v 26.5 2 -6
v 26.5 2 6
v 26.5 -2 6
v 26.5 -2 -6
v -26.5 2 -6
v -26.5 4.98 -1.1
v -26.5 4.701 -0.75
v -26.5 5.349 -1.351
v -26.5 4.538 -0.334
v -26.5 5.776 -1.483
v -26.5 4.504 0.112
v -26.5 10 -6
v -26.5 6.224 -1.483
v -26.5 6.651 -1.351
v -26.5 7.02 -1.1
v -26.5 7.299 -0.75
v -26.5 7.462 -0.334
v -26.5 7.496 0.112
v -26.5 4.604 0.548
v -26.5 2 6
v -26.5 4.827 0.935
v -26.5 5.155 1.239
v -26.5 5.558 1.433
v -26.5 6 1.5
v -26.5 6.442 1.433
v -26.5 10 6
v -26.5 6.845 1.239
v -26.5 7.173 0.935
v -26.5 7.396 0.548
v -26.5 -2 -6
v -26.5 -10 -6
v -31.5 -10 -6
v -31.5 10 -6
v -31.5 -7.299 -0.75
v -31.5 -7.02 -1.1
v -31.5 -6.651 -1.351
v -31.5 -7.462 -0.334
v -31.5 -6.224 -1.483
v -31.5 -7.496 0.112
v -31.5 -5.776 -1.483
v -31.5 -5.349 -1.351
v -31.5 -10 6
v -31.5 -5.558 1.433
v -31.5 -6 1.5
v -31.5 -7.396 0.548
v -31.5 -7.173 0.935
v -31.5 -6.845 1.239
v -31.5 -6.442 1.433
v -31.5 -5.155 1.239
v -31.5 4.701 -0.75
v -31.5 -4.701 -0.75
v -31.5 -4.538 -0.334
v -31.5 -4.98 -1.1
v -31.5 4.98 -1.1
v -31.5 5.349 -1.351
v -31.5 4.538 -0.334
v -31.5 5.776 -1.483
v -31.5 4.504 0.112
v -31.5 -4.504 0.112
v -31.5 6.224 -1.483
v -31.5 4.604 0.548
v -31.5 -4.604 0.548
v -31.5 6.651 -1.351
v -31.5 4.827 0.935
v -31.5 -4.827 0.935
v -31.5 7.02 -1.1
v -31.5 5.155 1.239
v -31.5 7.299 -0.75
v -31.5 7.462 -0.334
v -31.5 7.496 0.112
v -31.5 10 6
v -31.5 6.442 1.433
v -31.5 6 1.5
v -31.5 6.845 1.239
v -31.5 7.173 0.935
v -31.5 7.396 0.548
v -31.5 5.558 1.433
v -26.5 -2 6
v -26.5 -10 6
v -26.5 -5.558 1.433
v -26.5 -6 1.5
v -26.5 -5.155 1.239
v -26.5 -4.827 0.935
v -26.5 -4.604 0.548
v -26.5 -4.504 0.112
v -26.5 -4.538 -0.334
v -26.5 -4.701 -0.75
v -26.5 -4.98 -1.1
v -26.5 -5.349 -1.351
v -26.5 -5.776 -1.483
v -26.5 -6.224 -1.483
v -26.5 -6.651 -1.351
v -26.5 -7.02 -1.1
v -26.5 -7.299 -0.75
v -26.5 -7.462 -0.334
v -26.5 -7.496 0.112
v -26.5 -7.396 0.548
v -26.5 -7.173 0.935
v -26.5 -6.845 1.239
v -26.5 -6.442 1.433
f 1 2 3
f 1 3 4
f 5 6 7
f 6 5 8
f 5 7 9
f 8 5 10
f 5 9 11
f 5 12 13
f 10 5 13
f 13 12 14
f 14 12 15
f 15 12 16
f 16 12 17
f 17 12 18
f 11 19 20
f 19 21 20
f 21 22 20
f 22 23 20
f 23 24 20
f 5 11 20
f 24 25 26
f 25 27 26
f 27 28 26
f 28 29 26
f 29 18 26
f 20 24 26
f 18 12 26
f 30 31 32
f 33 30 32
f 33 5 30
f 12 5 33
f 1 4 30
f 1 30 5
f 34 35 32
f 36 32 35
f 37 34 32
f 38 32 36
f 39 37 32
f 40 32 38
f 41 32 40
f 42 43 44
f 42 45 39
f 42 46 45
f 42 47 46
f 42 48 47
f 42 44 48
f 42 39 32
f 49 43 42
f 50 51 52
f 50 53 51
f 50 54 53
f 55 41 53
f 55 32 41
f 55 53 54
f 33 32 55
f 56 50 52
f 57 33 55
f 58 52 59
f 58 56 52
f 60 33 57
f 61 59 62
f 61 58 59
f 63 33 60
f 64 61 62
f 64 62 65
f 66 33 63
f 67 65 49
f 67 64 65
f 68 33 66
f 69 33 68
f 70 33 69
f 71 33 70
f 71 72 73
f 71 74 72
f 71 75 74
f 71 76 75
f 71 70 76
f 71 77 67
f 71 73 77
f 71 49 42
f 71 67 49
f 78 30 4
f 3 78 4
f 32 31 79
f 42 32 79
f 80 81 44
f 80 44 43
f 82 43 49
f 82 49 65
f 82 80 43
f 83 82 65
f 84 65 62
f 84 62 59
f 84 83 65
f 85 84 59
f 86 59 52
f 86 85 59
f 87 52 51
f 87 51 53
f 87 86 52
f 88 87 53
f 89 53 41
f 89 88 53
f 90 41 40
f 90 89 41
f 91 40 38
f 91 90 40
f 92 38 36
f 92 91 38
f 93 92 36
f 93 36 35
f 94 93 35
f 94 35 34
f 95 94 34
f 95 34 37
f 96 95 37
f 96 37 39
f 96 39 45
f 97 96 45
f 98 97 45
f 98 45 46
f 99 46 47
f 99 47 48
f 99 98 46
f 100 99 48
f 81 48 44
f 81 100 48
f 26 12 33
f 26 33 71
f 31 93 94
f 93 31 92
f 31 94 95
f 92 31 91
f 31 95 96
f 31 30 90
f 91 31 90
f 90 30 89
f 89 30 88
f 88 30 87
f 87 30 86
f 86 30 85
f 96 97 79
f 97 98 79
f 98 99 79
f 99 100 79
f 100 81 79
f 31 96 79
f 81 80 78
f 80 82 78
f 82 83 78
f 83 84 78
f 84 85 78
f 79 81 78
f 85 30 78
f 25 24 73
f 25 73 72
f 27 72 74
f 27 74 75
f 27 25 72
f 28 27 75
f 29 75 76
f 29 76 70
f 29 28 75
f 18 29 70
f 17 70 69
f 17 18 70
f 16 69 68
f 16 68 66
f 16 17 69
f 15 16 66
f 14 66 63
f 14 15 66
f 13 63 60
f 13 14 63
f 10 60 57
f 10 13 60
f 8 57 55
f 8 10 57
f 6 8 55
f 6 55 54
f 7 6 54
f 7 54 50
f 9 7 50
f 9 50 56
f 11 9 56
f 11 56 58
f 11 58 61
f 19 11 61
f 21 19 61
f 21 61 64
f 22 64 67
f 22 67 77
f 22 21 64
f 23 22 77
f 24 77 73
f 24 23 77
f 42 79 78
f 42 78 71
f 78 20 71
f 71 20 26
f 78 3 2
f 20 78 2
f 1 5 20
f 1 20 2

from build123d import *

# Parameters (mm, degrees)
SKETCH_1_W      = 53
SKETCH_1_H      = 12
EXTRUDE_1_DEPTH = 2
SKETCH_2_W      = 12
SKETCH_2_H      = 20
SKETCH_2_R      = 1.5
EXTRUDE_2_DEPTH = 5


with BuildPart() as part:
    # 草图1 → 凸台-拉伸1 (new, symmetric)
    with BuildSketch(Plane(origin=(0, 0, 0), x_dir=(1, 0, 0), z_dir=(0, 1, 0))):
        Rectangle(SKETCH_1_W, SKETCH_1_H)
    extrude(amount=EXTRUDE_1_DEPTH, both=True)

    # 草图2 → 凸台-拉伸2 (add)
    with BuildSketch(Plane.ZY.offset(26.5)):
        Rectangle(SKETCH_2_W, SKETCH_2_H)
        with Locations((0, 6)):
            Circle(SKETCH_2_R, mode=Mode.SUBTRACT)
        with Locations((0, -6)):
            Circle(SKETCH_2_R, mode=Mode.SUBTRACT)
    extrude(amount=EXTRUDE_2_DEPTH)


solid = part.part
